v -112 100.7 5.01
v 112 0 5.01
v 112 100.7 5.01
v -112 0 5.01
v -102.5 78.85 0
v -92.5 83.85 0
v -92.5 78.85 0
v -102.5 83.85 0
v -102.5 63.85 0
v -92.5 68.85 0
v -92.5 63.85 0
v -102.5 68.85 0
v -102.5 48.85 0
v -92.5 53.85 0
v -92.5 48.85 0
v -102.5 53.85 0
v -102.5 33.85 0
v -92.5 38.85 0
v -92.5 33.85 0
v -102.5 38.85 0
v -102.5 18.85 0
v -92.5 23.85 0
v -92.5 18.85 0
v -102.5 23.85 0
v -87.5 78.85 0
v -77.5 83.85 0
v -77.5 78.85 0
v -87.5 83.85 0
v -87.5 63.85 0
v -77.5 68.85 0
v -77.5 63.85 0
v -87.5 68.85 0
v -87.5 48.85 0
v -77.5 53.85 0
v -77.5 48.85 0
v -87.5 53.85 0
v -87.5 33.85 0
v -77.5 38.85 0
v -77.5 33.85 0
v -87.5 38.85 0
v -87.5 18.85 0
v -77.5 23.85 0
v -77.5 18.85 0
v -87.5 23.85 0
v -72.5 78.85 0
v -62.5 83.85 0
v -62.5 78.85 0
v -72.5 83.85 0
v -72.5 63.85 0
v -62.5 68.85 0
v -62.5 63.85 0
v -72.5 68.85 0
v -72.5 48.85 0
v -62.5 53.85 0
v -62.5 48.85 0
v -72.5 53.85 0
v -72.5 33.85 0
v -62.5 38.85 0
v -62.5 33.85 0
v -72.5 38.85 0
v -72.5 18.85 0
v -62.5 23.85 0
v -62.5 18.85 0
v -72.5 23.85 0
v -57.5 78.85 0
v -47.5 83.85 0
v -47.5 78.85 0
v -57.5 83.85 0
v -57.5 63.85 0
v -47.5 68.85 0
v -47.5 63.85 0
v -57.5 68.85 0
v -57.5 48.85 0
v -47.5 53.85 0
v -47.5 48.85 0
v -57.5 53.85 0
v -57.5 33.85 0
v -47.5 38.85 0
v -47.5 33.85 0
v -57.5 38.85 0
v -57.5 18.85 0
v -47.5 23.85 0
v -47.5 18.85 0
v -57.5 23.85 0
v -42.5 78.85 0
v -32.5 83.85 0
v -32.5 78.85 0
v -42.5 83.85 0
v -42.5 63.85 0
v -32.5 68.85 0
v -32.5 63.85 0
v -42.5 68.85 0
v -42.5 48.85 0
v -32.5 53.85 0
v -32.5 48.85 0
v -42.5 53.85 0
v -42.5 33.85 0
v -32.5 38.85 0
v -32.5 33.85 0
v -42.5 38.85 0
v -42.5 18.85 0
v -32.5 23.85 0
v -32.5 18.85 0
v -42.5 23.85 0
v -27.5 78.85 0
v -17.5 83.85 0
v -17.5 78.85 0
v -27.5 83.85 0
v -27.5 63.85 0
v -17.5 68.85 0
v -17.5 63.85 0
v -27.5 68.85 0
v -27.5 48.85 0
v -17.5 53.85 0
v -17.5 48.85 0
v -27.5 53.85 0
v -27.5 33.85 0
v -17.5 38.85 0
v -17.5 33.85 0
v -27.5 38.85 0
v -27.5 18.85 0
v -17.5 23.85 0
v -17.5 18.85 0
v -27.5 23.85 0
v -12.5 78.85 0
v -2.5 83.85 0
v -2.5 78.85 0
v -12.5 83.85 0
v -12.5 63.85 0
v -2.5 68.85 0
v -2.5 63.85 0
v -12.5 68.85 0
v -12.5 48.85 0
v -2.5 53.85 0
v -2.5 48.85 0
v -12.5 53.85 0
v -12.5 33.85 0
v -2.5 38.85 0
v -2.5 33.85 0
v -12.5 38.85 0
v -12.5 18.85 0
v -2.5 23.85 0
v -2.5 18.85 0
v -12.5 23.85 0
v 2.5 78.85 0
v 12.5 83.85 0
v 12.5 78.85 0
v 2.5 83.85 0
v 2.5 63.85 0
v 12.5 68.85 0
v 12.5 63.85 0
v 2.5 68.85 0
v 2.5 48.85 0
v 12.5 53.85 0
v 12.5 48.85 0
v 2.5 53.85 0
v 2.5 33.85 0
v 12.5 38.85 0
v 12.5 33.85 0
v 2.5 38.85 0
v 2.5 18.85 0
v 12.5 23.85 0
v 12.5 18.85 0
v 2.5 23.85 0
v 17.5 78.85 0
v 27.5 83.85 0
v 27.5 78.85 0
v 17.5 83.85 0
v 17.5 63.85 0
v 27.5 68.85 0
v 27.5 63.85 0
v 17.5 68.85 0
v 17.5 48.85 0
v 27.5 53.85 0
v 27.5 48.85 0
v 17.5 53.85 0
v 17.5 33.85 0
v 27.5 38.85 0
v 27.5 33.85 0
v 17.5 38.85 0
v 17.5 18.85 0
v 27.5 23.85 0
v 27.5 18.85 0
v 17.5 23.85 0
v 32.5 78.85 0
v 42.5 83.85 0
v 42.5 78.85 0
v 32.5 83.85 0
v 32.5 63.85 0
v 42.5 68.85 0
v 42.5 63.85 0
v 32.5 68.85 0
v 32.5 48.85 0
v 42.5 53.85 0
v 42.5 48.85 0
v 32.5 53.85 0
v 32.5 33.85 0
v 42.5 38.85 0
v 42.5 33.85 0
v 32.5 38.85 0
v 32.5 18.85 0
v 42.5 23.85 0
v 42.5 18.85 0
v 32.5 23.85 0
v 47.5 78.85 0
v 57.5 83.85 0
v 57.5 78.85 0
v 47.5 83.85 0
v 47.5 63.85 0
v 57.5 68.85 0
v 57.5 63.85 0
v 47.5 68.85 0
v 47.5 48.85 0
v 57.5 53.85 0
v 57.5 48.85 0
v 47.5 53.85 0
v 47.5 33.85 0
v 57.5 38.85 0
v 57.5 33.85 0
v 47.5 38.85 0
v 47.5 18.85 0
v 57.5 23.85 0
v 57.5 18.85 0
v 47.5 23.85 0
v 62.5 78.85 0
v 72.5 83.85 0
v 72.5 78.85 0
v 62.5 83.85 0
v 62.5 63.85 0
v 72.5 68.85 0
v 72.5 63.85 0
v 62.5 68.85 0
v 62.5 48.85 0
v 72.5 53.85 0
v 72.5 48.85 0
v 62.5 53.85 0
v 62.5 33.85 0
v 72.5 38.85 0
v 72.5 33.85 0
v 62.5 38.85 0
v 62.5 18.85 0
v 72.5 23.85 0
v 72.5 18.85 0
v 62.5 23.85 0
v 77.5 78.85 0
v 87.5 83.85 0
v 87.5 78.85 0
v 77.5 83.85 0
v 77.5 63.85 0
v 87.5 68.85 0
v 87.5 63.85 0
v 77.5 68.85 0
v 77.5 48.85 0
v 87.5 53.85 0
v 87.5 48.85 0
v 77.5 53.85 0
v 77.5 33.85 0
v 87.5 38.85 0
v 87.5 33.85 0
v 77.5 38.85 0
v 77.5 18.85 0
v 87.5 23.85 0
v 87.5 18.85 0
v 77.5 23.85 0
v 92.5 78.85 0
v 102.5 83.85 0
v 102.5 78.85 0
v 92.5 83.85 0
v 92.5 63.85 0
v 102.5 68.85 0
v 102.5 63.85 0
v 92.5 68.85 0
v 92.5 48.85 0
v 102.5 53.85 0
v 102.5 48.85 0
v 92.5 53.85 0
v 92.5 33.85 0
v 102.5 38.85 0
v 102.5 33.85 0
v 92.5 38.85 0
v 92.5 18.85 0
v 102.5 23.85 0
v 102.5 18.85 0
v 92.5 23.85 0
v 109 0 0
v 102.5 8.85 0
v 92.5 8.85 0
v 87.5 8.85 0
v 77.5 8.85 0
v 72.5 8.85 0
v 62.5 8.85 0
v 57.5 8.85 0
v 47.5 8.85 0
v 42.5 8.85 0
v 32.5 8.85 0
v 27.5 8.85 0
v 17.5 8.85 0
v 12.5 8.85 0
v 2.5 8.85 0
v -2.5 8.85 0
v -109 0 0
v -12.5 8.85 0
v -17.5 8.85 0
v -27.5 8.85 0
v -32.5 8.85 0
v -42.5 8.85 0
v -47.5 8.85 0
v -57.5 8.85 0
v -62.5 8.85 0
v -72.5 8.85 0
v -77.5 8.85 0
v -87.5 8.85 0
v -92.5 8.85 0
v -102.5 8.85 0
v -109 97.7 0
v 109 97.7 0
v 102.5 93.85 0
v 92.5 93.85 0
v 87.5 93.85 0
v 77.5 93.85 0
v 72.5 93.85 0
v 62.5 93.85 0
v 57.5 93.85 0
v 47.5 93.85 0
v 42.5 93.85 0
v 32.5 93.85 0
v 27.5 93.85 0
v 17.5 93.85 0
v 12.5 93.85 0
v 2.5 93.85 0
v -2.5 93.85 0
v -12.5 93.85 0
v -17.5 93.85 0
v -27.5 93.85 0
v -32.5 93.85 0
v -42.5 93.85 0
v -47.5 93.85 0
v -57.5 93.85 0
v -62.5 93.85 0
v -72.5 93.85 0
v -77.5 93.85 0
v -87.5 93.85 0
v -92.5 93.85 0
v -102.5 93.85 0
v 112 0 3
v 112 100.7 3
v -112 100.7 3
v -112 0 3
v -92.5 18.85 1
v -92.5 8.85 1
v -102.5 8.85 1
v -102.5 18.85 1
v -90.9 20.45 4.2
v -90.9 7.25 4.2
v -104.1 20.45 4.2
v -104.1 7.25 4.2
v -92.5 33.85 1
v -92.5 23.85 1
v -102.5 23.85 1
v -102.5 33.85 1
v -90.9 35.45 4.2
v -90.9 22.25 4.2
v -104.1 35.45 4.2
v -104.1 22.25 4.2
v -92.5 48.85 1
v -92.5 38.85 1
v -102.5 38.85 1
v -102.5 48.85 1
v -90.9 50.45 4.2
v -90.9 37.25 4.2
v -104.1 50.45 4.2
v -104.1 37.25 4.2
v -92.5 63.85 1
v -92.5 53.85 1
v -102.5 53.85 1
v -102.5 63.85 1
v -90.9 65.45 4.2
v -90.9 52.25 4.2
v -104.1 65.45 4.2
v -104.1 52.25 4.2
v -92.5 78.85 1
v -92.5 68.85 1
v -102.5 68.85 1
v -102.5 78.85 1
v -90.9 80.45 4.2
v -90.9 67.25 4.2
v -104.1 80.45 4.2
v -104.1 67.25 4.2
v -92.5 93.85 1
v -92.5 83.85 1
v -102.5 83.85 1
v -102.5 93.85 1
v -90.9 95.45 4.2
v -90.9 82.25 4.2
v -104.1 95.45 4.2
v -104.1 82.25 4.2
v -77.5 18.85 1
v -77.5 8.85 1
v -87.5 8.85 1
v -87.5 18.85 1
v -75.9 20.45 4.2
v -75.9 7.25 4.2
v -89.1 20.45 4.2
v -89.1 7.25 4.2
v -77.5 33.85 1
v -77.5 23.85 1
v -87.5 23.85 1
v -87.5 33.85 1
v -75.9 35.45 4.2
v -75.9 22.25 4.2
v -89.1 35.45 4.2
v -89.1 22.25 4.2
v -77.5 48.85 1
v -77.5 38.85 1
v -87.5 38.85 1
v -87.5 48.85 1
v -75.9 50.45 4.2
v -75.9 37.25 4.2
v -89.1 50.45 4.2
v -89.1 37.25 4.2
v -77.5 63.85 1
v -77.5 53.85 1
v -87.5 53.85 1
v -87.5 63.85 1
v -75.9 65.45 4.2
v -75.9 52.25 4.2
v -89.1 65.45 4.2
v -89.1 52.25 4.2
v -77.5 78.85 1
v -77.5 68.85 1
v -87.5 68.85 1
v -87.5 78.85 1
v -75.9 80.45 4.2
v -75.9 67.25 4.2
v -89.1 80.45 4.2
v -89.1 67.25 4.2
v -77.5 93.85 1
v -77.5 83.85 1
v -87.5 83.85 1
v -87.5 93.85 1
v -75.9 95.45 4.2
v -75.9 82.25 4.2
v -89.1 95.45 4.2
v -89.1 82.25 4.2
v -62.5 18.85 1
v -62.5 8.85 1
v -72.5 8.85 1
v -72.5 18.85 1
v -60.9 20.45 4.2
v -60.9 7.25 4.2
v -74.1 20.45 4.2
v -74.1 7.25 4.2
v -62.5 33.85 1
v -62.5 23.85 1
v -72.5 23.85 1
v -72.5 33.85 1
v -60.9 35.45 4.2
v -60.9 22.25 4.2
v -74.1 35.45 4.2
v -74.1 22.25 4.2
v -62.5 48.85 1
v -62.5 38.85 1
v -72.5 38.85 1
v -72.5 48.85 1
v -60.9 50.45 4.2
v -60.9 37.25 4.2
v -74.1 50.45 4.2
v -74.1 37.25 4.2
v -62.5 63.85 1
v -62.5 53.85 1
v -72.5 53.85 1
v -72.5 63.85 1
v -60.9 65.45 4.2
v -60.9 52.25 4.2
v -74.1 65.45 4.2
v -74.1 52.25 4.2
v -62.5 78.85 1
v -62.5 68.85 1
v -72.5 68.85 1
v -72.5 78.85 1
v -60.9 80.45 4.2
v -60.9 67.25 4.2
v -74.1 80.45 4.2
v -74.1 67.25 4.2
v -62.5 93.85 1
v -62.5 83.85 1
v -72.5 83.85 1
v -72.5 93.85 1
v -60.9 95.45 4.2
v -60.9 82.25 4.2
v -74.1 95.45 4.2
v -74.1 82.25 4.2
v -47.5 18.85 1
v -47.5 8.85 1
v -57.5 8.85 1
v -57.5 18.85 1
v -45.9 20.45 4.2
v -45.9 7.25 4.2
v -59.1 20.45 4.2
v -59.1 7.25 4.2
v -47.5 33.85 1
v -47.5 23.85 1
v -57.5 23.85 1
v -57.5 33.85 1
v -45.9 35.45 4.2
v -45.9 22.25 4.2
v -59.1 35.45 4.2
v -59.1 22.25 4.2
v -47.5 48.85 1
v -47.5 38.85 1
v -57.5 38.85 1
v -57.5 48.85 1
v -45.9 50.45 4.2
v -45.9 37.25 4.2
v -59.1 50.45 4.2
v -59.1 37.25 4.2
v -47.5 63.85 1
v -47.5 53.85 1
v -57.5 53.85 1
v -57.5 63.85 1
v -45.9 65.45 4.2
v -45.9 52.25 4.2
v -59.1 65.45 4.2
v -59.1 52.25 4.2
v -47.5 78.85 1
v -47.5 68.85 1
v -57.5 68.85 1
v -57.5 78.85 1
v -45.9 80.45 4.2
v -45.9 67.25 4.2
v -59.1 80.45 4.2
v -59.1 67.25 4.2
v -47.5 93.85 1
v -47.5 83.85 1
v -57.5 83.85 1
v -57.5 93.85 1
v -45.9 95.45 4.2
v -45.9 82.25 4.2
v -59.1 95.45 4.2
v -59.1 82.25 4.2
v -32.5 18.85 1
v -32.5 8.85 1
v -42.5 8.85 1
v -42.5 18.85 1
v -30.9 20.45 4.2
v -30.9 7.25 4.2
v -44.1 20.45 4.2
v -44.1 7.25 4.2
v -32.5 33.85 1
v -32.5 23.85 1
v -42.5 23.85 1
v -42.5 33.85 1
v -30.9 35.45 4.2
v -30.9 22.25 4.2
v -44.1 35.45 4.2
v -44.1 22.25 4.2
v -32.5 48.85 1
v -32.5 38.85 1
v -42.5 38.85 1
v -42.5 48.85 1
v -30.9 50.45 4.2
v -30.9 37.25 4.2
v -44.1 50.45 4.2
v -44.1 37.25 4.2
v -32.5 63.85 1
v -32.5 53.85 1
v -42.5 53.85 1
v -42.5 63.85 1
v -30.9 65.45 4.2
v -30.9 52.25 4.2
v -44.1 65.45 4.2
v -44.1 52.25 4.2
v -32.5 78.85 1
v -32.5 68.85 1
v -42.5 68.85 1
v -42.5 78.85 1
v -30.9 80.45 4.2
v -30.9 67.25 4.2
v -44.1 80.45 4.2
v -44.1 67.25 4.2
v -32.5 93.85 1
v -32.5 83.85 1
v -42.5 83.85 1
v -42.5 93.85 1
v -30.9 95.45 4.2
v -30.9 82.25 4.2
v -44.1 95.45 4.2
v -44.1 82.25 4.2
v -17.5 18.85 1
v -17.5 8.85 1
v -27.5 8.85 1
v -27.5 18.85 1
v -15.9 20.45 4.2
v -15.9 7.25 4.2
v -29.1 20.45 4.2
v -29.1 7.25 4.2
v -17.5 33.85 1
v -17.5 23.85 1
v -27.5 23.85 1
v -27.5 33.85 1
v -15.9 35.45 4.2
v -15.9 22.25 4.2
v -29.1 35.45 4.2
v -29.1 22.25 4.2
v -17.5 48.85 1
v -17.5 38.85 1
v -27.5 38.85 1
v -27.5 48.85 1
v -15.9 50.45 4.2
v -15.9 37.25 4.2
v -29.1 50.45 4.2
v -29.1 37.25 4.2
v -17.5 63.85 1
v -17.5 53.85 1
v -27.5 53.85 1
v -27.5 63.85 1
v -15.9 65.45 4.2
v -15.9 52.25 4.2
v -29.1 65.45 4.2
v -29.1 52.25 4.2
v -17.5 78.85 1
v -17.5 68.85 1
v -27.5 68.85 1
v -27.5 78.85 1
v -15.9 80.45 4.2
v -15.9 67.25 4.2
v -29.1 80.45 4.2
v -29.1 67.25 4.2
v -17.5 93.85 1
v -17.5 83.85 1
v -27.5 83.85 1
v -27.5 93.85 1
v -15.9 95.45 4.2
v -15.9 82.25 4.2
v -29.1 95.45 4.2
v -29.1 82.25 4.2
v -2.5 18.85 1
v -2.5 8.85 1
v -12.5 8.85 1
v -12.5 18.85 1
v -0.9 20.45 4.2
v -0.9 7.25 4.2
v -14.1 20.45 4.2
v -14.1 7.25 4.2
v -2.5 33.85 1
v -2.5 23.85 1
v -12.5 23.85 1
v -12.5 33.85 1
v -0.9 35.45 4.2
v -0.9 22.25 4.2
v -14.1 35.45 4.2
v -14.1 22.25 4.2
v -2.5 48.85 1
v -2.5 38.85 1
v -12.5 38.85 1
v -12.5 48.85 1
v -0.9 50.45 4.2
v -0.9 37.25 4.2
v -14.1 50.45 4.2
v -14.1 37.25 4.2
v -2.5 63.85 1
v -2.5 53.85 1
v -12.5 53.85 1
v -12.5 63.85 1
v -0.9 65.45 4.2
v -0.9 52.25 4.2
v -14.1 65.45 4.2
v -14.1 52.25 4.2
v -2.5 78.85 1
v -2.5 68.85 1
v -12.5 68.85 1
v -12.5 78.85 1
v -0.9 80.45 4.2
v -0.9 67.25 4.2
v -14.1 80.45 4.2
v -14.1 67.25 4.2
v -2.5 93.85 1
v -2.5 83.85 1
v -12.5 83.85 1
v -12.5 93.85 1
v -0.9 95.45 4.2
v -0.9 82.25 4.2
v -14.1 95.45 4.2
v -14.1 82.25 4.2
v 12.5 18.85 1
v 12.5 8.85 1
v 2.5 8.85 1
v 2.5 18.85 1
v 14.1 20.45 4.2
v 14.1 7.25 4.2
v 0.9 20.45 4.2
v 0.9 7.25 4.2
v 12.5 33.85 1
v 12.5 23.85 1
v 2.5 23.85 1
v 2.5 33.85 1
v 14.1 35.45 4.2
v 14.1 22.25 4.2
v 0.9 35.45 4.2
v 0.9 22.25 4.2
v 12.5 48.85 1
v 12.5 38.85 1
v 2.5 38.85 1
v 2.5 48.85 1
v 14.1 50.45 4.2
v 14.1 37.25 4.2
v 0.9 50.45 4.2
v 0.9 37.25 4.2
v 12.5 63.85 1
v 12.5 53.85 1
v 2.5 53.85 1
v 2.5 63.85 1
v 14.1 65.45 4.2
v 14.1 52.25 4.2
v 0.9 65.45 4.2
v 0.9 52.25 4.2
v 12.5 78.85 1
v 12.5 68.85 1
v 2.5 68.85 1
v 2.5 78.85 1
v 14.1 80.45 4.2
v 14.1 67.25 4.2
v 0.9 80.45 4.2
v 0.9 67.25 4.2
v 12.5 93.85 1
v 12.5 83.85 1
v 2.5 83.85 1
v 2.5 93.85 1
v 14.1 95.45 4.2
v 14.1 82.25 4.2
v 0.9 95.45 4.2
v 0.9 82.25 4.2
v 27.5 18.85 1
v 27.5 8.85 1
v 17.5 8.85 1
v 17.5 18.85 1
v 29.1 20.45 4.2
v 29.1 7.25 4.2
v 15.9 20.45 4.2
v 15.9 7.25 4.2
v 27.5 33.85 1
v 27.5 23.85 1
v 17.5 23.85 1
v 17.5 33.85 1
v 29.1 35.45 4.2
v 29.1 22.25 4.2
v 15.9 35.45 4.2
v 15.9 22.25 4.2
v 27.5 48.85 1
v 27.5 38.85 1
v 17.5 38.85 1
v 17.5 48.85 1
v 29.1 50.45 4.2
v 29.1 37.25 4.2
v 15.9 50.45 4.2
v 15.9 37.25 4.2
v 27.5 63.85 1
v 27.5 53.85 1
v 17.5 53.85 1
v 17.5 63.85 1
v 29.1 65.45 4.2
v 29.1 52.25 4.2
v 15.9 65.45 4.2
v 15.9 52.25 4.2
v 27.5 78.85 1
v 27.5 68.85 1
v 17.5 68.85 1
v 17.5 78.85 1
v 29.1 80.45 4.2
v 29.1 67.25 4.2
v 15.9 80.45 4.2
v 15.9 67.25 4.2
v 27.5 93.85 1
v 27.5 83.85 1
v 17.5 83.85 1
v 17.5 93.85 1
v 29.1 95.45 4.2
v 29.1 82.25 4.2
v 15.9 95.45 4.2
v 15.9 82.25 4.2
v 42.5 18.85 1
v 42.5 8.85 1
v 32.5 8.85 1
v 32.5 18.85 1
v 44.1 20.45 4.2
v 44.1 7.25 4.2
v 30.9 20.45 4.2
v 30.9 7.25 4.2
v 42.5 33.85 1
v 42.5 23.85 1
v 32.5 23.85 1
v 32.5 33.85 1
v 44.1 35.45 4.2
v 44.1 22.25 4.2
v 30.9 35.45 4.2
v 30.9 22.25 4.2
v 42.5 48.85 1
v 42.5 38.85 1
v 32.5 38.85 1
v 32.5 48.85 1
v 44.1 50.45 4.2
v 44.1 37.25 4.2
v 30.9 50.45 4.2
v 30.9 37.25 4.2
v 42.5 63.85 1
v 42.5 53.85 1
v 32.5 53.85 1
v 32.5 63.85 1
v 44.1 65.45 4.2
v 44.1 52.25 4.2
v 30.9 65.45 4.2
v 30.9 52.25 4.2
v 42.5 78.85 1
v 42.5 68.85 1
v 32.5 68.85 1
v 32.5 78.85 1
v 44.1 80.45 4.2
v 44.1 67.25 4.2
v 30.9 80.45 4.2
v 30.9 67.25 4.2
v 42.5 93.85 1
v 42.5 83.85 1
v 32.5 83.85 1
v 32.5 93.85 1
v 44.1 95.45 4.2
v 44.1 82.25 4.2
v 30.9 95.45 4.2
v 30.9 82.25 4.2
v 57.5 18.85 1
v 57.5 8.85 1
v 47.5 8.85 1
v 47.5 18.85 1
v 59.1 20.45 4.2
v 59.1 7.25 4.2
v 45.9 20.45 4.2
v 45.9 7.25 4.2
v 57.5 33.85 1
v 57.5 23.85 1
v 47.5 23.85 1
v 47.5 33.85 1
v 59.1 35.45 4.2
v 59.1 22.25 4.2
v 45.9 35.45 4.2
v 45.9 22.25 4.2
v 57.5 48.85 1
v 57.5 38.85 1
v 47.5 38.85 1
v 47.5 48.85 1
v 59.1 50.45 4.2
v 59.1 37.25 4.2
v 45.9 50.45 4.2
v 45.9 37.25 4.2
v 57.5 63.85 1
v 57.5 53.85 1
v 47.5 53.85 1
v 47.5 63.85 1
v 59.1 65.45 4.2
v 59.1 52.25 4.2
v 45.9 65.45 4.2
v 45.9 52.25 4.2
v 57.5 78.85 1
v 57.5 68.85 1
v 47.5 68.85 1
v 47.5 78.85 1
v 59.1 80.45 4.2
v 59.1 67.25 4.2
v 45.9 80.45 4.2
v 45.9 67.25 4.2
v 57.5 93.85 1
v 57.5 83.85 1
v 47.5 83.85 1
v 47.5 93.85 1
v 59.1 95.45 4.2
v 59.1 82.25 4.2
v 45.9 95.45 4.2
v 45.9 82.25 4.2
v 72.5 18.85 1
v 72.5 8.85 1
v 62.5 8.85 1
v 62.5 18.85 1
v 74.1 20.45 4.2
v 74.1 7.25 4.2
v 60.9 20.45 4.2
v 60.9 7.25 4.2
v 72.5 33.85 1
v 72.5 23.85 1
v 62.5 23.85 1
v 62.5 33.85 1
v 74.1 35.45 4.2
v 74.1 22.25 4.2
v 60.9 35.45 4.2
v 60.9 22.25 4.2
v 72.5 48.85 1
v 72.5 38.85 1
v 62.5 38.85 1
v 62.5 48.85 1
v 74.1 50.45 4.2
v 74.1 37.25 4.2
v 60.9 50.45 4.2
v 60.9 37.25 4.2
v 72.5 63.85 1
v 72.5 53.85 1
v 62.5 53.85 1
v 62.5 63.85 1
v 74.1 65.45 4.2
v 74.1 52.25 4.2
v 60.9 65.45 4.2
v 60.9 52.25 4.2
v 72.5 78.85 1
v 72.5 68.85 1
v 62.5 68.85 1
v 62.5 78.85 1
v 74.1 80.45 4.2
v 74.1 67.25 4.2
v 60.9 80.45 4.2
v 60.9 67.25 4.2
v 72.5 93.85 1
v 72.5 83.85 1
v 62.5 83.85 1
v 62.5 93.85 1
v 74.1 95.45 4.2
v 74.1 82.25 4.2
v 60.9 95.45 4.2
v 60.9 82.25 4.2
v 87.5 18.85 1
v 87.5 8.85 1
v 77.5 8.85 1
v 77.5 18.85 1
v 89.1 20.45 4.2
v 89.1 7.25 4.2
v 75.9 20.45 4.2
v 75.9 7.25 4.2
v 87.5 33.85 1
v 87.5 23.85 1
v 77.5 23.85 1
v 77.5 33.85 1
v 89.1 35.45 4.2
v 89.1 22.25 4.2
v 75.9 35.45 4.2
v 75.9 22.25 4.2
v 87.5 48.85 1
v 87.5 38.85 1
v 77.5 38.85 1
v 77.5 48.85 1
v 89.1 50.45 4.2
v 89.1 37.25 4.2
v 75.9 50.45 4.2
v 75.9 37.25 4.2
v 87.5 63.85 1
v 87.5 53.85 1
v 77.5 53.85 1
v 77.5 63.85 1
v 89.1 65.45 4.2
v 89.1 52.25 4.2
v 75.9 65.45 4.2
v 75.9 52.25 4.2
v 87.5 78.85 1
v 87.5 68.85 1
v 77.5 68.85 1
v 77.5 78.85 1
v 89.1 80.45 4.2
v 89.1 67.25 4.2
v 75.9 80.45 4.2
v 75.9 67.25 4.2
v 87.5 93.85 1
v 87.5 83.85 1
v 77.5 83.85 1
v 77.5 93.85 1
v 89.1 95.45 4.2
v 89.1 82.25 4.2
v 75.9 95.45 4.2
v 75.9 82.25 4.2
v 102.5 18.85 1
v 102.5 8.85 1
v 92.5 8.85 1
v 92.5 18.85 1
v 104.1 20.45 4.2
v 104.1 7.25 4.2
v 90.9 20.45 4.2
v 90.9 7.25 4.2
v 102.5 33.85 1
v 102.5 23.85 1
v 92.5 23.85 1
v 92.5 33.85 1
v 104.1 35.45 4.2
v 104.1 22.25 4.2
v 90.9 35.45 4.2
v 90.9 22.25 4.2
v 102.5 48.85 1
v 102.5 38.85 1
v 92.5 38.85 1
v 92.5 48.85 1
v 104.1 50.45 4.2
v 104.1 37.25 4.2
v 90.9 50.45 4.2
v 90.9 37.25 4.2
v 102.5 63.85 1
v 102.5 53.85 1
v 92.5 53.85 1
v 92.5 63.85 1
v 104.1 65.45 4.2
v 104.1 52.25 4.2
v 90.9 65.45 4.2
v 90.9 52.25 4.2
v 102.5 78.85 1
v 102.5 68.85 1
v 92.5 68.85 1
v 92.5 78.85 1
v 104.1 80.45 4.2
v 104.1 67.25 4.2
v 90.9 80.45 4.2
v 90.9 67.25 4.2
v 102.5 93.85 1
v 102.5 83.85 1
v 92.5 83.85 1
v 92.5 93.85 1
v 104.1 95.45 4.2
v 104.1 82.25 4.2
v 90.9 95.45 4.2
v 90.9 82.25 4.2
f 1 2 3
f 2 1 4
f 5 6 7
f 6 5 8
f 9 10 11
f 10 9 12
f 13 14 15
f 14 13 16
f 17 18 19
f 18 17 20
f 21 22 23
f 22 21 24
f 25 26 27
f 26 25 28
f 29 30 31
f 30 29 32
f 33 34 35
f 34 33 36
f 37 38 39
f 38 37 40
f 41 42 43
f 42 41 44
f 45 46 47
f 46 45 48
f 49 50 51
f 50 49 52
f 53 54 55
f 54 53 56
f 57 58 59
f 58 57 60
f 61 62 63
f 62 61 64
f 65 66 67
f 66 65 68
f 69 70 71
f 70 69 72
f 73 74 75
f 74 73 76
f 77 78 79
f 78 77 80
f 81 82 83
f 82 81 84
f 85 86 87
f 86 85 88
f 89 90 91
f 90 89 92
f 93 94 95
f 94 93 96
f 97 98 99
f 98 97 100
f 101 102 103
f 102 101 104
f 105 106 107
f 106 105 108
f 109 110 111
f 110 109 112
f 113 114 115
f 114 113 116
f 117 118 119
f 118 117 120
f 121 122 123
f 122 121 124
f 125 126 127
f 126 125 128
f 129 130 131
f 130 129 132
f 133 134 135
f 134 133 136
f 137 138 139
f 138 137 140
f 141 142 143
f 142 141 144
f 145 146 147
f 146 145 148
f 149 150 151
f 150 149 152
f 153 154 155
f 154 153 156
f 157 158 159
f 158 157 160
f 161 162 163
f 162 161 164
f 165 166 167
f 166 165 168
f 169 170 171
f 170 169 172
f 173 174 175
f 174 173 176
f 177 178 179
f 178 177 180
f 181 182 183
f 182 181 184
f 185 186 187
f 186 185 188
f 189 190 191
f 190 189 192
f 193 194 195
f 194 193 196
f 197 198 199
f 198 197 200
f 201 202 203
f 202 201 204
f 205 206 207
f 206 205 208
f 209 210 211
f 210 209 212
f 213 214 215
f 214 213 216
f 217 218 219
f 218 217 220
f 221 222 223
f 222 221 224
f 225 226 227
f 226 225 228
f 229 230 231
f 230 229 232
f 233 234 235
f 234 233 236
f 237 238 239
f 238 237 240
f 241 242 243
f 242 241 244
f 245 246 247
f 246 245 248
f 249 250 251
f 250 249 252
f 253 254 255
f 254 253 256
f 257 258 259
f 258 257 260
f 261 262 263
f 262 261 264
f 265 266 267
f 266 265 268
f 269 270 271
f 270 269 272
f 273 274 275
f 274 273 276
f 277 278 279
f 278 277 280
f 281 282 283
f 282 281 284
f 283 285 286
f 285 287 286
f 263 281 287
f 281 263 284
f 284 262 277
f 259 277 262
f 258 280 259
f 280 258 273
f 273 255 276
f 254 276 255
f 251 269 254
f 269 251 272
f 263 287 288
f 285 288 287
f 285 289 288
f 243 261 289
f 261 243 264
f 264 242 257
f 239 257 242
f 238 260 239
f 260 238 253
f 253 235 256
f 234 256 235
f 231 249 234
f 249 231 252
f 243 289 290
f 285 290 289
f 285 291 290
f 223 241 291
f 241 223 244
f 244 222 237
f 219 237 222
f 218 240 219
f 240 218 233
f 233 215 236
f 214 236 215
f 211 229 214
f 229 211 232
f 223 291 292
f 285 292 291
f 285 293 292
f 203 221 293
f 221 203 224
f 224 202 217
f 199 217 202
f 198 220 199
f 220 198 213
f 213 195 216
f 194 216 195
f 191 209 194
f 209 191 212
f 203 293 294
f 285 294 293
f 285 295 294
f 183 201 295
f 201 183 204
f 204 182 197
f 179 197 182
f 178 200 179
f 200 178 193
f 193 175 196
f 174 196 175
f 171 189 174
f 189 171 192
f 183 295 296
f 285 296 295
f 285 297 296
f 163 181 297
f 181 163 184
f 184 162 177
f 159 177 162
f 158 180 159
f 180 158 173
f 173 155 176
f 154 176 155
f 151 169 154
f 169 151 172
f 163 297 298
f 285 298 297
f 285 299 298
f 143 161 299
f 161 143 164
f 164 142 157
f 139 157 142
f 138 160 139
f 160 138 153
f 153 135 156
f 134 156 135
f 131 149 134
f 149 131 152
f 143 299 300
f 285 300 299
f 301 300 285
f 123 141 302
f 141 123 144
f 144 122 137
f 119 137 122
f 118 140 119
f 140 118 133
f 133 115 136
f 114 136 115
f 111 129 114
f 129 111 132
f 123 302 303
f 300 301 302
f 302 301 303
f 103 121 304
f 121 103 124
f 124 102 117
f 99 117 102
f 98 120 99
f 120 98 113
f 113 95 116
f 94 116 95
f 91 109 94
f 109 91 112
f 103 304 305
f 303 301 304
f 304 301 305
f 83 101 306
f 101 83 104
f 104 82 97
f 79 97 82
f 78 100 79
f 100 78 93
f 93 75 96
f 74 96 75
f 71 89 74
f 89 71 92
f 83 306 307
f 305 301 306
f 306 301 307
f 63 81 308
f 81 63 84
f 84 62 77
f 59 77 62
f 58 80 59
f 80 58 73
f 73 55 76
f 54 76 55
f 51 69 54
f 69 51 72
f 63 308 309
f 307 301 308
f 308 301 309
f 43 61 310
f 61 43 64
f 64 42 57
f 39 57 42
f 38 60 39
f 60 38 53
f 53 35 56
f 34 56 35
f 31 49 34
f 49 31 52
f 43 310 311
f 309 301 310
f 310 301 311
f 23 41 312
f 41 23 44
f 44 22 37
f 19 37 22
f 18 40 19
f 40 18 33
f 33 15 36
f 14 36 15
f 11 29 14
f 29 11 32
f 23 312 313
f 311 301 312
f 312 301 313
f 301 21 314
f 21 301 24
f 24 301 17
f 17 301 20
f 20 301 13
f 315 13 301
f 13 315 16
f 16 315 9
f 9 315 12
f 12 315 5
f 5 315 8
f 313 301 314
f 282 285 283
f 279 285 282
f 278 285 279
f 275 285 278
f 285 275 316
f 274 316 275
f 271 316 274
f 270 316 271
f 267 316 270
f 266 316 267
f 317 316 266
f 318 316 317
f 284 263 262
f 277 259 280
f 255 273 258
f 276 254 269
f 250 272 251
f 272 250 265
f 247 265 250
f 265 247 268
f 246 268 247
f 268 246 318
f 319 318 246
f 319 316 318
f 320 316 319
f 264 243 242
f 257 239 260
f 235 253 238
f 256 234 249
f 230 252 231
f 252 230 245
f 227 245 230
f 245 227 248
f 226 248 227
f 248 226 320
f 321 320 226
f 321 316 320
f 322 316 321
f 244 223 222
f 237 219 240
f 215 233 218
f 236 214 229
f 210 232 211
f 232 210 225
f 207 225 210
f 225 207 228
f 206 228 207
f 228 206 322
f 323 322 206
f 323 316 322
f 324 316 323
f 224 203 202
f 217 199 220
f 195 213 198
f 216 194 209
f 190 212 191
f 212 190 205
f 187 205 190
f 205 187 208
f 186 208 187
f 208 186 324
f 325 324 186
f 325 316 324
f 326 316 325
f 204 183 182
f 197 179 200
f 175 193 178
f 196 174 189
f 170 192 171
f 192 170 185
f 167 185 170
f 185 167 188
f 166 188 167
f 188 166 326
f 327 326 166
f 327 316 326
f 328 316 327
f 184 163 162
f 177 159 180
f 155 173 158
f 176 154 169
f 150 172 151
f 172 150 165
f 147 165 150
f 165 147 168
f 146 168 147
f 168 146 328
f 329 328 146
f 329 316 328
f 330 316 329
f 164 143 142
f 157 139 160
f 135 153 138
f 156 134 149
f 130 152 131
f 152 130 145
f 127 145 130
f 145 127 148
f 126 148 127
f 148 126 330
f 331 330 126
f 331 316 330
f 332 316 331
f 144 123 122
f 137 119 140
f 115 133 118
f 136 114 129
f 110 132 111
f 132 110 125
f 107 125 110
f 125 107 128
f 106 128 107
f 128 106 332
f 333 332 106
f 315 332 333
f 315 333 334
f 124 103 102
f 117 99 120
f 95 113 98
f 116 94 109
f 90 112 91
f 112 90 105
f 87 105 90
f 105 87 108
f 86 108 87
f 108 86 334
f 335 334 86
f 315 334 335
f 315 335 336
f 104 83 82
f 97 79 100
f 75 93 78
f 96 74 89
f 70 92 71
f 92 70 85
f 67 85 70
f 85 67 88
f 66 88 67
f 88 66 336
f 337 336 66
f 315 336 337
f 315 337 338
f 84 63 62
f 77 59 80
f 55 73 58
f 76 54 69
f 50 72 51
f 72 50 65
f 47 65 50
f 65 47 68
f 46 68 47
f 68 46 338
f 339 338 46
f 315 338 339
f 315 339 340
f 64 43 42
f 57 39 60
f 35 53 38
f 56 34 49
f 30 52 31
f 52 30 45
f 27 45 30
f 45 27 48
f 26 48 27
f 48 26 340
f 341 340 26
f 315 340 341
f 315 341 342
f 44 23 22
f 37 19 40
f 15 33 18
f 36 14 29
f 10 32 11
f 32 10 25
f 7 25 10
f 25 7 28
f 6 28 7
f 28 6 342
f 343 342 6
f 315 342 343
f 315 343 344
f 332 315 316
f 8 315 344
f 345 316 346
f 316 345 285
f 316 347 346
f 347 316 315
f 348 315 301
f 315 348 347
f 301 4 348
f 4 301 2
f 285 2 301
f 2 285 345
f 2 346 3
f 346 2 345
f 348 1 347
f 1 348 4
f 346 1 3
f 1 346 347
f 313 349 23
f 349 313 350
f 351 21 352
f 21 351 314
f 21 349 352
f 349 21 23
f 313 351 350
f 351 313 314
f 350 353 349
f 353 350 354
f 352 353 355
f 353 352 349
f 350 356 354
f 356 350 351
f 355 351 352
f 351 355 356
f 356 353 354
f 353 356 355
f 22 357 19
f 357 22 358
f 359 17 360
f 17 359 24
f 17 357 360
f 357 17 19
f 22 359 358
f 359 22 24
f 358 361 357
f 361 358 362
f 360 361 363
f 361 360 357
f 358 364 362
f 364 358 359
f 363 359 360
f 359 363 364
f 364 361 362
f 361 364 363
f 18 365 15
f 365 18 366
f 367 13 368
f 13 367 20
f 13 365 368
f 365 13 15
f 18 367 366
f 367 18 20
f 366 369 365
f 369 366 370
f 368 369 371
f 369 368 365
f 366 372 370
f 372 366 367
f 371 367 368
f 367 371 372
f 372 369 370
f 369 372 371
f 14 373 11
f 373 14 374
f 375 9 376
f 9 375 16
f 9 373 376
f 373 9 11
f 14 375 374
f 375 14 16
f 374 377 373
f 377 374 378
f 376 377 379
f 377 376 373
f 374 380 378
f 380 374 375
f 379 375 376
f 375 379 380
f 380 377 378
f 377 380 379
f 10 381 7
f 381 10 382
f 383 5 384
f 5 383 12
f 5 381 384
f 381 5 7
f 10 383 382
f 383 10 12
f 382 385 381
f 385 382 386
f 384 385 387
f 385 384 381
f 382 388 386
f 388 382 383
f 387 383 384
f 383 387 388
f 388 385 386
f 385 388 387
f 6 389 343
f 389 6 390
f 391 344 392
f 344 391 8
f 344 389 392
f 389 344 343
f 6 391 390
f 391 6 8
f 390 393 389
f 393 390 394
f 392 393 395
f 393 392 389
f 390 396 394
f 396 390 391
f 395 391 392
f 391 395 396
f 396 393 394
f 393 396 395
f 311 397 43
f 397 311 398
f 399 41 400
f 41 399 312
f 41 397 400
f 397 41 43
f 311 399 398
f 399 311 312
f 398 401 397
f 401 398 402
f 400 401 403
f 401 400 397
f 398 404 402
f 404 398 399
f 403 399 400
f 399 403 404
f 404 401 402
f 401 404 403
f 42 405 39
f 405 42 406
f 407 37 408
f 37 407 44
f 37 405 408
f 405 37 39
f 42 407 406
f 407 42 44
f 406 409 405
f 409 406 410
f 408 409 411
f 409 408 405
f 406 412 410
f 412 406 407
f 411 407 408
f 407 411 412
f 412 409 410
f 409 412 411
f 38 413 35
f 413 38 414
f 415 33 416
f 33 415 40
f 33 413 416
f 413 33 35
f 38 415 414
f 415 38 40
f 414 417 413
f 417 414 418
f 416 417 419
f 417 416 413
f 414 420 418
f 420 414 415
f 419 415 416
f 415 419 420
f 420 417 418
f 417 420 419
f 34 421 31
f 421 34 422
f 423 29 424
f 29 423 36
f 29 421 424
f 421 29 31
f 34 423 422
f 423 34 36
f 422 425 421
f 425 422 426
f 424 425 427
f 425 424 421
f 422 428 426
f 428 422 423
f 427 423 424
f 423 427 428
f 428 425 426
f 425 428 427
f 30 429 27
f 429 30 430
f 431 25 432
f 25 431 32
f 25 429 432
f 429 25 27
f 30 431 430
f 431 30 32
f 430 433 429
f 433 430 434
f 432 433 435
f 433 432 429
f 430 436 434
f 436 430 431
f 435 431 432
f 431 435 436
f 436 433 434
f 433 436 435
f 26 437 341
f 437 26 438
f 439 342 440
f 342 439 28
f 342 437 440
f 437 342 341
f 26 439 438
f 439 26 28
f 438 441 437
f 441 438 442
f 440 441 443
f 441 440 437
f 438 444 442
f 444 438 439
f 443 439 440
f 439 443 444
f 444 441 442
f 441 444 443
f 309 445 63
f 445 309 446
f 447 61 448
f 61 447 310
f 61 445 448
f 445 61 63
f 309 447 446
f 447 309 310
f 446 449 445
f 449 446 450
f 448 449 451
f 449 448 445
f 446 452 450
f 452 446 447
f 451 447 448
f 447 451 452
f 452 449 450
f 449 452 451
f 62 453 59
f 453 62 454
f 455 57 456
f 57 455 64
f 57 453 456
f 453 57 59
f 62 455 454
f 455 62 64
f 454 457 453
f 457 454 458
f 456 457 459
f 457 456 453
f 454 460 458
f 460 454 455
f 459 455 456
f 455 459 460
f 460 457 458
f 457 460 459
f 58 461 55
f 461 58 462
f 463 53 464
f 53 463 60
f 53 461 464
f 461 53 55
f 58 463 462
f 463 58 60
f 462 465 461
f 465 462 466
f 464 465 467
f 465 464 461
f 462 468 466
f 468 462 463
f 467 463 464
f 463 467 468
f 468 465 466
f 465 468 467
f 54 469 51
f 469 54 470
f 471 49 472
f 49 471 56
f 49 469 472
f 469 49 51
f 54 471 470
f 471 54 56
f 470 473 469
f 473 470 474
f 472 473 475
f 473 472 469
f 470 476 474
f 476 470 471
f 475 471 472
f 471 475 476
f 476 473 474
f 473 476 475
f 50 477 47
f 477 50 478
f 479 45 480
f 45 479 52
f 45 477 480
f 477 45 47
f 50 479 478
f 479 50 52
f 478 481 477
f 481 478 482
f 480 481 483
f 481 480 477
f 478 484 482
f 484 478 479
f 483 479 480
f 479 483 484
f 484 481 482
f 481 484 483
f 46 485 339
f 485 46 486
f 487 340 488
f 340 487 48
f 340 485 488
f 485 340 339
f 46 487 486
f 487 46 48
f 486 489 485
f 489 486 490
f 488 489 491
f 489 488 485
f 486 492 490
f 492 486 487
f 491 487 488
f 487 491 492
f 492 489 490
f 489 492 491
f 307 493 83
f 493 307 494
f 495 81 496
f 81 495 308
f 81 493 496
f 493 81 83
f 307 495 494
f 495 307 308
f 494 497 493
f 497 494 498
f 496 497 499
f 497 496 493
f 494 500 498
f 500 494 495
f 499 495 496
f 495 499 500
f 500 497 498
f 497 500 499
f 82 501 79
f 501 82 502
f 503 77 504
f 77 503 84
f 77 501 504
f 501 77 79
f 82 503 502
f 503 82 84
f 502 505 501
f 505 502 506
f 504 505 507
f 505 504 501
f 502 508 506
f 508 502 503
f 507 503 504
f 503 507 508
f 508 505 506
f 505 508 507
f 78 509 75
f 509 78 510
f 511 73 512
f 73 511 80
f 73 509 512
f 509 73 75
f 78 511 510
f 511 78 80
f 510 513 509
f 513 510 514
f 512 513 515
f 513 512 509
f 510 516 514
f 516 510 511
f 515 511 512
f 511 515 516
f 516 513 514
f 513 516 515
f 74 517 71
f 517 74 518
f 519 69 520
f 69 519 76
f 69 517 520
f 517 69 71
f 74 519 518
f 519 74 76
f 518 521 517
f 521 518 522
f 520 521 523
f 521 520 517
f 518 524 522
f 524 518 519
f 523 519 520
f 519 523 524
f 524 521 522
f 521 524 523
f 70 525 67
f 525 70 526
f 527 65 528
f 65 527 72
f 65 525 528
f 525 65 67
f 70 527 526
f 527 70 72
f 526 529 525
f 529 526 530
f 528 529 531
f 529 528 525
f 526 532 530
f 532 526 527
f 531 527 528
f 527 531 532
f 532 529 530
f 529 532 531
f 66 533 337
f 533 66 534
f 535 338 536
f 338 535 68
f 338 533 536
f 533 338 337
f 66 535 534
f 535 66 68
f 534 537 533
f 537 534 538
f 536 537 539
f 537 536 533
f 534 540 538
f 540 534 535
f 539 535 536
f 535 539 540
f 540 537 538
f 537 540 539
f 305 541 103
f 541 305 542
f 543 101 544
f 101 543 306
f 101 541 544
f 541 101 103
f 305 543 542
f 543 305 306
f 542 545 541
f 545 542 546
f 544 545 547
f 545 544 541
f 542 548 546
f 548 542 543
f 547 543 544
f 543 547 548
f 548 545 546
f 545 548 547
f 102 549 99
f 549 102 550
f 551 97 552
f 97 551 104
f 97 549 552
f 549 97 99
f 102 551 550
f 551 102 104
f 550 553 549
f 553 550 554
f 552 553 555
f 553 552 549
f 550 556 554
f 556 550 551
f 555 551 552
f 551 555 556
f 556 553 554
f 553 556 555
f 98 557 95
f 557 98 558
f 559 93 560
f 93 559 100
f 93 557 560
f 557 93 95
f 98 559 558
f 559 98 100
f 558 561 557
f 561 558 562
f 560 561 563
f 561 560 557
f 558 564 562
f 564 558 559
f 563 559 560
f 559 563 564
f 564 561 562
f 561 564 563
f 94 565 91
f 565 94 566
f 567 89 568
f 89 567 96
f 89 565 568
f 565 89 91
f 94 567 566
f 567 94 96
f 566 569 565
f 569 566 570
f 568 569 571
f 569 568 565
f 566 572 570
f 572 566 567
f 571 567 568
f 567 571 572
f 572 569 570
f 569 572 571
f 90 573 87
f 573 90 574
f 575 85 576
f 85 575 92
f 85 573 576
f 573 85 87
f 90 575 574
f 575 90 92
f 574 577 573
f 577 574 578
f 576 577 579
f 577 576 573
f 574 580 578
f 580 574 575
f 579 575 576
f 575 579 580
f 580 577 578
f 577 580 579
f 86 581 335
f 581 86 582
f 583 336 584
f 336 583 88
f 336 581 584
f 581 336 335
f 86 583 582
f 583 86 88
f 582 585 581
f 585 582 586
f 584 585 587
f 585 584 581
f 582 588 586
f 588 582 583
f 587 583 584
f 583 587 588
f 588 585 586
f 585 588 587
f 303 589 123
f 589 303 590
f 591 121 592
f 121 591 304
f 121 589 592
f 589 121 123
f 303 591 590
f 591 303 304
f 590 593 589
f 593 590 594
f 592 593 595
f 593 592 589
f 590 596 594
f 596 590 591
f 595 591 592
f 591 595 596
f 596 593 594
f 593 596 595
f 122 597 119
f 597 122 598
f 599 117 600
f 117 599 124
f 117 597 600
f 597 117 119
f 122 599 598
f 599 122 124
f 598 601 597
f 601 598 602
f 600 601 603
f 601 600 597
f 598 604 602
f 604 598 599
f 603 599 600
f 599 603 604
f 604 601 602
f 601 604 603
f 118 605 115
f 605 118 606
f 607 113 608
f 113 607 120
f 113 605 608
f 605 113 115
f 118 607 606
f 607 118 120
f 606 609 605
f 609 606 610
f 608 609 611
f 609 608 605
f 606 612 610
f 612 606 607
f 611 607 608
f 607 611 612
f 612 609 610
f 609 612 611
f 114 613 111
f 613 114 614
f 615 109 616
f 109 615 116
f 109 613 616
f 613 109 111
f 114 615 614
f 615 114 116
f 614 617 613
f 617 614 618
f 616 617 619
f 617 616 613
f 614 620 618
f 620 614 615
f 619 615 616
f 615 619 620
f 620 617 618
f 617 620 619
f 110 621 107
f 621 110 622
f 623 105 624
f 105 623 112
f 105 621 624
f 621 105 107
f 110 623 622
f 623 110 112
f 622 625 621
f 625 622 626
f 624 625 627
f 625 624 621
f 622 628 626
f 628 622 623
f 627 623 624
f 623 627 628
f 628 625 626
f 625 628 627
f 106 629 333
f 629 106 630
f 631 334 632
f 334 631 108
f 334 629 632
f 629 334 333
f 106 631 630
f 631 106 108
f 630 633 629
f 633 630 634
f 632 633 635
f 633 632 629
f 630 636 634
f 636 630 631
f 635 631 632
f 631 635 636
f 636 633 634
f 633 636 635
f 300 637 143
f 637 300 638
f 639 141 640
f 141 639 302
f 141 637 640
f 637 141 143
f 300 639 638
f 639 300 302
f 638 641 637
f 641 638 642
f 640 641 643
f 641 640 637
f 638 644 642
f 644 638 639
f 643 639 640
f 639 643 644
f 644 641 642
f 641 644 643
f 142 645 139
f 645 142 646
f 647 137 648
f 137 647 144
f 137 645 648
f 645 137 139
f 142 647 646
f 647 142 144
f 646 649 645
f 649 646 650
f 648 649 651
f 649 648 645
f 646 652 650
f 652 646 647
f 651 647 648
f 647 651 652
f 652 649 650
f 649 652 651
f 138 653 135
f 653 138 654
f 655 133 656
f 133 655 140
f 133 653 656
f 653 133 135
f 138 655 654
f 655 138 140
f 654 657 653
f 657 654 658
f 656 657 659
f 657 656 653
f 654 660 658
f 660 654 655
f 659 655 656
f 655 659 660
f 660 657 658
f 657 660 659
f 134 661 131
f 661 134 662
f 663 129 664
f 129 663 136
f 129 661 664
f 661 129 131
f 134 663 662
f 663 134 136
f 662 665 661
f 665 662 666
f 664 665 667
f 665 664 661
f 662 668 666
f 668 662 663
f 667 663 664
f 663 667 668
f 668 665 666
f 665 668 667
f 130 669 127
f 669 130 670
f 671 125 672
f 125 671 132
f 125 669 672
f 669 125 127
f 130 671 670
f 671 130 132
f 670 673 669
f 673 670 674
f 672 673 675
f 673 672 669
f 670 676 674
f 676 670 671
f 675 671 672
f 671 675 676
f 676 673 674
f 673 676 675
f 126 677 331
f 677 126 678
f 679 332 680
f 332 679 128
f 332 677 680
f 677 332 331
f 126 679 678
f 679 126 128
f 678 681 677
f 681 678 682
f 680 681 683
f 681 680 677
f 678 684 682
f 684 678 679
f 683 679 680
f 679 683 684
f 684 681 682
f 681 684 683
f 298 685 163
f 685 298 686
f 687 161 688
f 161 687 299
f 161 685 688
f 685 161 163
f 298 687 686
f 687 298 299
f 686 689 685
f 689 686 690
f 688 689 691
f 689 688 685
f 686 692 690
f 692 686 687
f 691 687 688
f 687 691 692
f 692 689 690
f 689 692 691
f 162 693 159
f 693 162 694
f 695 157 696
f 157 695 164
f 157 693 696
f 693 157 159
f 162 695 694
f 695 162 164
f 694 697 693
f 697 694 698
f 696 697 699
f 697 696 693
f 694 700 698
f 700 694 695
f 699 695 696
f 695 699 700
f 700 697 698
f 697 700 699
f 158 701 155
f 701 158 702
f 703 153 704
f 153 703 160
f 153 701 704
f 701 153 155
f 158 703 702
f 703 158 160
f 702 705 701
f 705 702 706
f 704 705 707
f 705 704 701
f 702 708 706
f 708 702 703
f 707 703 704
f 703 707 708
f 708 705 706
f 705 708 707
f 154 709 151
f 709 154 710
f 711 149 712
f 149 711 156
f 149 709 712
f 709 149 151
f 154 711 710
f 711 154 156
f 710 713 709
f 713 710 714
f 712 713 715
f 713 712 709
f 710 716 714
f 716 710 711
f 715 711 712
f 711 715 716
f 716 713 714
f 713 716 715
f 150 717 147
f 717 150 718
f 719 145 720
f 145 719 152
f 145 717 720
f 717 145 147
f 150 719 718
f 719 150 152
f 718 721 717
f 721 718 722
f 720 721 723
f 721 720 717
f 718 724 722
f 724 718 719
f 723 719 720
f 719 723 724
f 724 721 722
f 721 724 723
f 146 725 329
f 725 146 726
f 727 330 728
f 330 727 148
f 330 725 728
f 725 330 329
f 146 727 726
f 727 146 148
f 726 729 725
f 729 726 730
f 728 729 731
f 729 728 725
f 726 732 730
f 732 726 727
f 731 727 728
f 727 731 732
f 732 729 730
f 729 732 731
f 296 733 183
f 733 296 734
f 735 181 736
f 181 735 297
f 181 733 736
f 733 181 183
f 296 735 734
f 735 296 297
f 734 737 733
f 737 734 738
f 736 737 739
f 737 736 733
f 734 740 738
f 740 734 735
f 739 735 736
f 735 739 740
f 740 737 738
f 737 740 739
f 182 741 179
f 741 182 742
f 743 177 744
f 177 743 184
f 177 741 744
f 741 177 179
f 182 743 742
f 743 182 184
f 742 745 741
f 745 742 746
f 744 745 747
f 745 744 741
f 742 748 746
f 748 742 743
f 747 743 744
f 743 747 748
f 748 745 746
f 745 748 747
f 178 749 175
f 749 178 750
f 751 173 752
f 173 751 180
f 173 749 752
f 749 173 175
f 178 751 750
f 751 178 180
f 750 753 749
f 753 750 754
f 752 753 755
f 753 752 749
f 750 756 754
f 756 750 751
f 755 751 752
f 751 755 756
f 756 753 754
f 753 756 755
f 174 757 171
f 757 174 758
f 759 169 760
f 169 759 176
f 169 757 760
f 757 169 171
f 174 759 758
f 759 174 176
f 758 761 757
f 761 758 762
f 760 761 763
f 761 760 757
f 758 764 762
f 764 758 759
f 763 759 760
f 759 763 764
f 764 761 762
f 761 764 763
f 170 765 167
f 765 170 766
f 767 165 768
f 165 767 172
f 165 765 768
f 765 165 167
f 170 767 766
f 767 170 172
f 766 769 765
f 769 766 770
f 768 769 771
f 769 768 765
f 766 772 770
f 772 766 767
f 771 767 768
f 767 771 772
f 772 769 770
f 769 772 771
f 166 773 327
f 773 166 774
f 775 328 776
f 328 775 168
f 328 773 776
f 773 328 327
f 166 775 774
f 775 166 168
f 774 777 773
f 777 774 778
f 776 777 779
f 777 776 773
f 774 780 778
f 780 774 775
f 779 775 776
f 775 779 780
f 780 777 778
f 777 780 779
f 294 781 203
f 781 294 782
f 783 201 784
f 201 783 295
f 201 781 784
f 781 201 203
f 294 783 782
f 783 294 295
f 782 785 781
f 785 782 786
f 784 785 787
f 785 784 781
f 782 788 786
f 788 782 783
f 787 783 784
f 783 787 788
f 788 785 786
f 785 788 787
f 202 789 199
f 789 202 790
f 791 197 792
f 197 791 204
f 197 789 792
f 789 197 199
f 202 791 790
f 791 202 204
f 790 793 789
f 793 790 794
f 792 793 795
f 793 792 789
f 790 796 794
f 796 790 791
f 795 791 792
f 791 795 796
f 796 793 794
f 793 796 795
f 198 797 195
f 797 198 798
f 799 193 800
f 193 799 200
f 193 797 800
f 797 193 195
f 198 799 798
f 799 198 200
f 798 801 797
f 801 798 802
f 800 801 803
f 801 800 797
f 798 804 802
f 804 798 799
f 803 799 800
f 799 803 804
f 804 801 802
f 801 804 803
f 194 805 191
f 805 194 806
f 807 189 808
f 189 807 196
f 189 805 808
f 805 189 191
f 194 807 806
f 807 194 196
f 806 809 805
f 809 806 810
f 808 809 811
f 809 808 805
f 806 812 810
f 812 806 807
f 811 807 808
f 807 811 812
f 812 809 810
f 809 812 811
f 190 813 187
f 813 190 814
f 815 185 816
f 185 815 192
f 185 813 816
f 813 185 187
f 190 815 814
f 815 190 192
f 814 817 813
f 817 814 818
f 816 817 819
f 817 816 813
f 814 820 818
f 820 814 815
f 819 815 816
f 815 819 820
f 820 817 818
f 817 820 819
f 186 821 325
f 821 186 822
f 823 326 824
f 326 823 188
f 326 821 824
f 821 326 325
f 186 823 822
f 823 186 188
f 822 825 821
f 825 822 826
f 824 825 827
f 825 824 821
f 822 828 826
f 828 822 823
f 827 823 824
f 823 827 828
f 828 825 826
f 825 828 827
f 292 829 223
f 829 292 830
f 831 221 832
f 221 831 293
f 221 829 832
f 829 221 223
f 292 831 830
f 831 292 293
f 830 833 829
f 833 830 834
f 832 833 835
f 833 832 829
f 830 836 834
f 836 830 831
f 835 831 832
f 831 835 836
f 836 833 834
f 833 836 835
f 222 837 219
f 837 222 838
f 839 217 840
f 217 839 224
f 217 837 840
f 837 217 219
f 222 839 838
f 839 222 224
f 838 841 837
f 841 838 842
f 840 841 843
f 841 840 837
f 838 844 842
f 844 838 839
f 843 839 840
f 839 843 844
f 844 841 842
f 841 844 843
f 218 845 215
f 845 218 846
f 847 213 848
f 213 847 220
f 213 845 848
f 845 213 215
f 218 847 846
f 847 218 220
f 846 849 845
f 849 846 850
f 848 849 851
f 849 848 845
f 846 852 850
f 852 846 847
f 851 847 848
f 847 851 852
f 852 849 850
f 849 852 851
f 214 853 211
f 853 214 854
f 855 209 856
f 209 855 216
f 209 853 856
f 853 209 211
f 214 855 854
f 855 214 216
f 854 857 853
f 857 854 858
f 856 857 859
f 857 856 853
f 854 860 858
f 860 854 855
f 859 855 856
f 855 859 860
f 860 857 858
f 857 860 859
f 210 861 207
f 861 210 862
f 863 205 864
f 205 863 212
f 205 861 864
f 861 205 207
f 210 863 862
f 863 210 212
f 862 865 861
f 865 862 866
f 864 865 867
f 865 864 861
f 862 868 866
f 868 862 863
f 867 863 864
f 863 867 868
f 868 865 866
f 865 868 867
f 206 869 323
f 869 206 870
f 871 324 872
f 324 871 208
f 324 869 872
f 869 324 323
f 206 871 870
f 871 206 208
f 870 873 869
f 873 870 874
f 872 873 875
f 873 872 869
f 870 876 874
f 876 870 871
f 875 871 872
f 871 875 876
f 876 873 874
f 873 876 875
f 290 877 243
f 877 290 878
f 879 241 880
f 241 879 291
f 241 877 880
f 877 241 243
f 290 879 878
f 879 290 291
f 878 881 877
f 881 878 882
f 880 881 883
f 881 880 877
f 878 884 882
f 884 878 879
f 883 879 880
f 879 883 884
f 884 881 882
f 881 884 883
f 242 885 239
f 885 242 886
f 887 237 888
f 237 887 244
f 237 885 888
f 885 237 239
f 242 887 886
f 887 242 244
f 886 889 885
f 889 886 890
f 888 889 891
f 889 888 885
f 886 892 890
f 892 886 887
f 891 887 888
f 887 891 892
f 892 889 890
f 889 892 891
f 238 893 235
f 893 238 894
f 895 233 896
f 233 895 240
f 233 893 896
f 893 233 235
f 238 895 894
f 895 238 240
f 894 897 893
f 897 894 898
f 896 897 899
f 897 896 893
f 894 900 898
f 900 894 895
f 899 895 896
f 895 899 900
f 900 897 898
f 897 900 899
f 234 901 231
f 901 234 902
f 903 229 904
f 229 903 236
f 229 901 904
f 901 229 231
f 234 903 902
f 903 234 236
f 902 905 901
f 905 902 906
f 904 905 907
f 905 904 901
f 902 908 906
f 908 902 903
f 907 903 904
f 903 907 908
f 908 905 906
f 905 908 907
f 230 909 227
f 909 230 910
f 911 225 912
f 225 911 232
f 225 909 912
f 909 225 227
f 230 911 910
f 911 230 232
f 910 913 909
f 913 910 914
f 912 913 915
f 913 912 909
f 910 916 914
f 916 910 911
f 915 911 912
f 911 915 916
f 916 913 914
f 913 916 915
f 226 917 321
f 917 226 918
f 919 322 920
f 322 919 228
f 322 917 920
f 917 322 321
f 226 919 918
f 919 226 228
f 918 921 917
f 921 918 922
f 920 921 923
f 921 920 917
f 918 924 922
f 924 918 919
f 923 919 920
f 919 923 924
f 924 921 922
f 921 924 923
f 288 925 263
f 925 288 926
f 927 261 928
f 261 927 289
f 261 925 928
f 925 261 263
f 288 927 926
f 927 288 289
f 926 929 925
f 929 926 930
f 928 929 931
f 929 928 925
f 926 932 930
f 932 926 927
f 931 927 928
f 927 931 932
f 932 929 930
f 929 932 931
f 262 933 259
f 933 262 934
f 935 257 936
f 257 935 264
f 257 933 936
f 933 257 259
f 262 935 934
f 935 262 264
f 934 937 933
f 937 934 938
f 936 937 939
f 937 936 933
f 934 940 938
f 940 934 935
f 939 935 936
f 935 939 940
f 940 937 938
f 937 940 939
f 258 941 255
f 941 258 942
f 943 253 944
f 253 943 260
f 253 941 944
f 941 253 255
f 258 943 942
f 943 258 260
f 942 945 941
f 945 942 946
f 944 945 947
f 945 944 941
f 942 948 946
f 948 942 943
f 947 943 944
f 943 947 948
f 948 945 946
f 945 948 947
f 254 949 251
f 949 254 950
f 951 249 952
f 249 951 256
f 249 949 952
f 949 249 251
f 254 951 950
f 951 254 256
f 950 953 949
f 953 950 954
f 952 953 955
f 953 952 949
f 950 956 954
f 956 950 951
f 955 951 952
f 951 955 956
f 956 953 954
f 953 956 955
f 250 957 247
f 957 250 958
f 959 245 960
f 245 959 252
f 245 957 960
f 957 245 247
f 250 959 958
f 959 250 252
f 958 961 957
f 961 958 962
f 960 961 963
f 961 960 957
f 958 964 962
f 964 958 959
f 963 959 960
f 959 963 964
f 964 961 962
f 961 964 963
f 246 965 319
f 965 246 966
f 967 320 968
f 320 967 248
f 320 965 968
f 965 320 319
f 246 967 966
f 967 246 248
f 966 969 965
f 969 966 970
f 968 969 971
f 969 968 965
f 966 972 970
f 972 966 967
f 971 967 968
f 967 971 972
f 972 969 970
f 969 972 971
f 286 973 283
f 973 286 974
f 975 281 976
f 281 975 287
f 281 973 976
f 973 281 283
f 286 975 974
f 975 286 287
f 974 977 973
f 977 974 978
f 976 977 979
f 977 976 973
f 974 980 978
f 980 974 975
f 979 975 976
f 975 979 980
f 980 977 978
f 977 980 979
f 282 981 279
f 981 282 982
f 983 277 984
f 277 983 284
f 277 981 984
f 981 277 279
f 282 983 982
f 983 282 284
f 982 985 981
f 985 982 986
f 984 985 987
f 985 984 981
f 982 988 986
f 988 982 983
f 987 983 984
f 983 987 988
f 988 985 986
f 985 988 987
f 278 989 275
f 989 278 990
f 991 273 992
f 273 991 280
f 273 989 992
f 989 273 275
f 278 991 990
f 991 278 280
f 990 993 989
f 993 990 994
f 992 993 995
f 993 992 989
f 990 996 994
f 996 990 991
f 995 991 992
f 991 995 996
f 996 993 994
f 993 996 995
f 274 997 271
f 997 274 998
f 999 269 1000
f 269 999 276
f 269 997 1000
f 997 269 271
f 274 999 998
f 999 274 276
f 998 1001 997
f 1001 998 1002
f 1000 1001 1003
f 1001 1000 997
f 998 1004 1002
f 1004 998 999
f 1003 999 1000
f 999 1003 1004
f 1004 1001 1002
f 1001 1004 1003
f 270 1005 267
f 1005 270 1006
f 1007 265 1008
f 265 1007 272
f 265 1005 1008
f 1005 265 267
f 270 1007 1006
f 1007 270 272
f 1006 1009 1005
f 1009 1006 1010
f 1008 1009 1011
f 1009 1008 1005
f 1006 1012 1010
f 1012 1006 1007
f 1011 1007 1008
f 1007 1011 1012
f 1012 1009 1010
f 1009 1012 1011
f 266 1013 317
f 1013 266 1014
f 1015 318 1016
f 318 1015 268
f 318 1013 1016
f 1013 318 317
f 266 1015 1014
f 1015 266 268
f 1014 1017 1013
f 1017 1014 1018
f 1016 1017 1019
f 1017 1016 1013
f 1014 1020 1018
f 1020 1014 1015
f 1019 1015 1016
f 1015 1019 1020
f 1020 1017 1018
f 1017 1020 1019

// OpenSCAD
// file: constants.scad
SCREEN_ATT_L = 227;
SCREEN_ATT_W = 158              +1;

SCREEN_LCD_L = 223;
SCREEN_LCD_W = 125;

CASE_WALL    = 10;

CASE_INNER_L = 280; // >= SCREEN_LCD_L + 50;
CASE_INNER_W = 180; // >= SCREEN_LCD_W + 50;

CASE_INNER_H_NES = 50;

CASE_OUTER_L = CASE_INNER_L + CASE_WALL*2;
CASE_OUTER_W = CASE_INNER_W + CASE_WALL*2;

echo(CASE_INNER_L);
echo(CASE_INNER_W);

echo(CASE_OUTER_L);
echo(CASE_OUTER_W);

LID_BEZEL_L0_L        = 319     +5;
LID_BEZEL_L0_W        = 223     +5;
LID_BEZEL_L0_TH       =   3;
LID_BEZEL_L0_TH0      =   .4;
LID_BEZEL_L0_PLAY     =   1;
LID_BEZEL_L0_HINGE_R  =  16;
LID_BEZEL_L0_PILLAR_H =   6.5  +4;
LID_BEZEL_L0_PILLAR_D =  13;

LID_BEZEL_L0_SIDE_CLR =  20;

SCREW_D               =   2.5;


ATOM = 0.001;
// main file
include <constants.scad>

W = 227     +1.0;
H = 103     -0.3;
TH1 = 2;
TH2 = 5;

TTH = .8;

ATOM = 0.01;

D  = 10;
SP = 5;

function get_holes_d_sp() = [D, SP];

module hole(extent=0) {  
    intersection() {
        union() {
            // narrow entry
            translate([-D/2, -D/2, -extent])
            cube([D, D, TH2*4], center=!true);

            // conical chamber
            z = 1;
            translate([0, 0, z])
            hull() {
                translate([-D/2, -D/2, 0])
                cube([D, D, TH2*4]);

                translate([-D, -D, D])
                cube([D*2, D*2, TH2*4]);
            }
        }

        translate([0, 0, -TTH])
        cylinder(d=D*2, h=TH2);        
    }
}

module holes() {
    nx = floor(W / (D+SP))-1;
    ny = floor(H / (D+SP));

    for (i=[-nx/2+.5:nx/2-.5]) {
        for (j=[-ny/2+.5:ny/2-.5]) {
            translate([(i)*(D+SP)-W/2*0, j*(D+SP)+H/2, 0]) {
                hole(ATOM);
            }
        }
    }
}

module side_plate() {
    difference() {
        translate([-W/2, 0, 0])
        intersection() {
            hull() {
                translate([0, 0, TH2])
                cube([W, H, ATOM]);

                translate([TH2, TH2*0, 0])
                cube([W-TH2*2, H-TH2*1, ATOM]);
            }
            
            // unsharpen edges
            translate([TH1, 0, 0])
            cube([W-TH1*2, H-TH1*1, TH2*2]);
        }

        holes();
    }
}


difference() {
    side_plate();

    //translate([-W/2 + 24, 22, -1]) cube([W, H, TH2*2]);
}
